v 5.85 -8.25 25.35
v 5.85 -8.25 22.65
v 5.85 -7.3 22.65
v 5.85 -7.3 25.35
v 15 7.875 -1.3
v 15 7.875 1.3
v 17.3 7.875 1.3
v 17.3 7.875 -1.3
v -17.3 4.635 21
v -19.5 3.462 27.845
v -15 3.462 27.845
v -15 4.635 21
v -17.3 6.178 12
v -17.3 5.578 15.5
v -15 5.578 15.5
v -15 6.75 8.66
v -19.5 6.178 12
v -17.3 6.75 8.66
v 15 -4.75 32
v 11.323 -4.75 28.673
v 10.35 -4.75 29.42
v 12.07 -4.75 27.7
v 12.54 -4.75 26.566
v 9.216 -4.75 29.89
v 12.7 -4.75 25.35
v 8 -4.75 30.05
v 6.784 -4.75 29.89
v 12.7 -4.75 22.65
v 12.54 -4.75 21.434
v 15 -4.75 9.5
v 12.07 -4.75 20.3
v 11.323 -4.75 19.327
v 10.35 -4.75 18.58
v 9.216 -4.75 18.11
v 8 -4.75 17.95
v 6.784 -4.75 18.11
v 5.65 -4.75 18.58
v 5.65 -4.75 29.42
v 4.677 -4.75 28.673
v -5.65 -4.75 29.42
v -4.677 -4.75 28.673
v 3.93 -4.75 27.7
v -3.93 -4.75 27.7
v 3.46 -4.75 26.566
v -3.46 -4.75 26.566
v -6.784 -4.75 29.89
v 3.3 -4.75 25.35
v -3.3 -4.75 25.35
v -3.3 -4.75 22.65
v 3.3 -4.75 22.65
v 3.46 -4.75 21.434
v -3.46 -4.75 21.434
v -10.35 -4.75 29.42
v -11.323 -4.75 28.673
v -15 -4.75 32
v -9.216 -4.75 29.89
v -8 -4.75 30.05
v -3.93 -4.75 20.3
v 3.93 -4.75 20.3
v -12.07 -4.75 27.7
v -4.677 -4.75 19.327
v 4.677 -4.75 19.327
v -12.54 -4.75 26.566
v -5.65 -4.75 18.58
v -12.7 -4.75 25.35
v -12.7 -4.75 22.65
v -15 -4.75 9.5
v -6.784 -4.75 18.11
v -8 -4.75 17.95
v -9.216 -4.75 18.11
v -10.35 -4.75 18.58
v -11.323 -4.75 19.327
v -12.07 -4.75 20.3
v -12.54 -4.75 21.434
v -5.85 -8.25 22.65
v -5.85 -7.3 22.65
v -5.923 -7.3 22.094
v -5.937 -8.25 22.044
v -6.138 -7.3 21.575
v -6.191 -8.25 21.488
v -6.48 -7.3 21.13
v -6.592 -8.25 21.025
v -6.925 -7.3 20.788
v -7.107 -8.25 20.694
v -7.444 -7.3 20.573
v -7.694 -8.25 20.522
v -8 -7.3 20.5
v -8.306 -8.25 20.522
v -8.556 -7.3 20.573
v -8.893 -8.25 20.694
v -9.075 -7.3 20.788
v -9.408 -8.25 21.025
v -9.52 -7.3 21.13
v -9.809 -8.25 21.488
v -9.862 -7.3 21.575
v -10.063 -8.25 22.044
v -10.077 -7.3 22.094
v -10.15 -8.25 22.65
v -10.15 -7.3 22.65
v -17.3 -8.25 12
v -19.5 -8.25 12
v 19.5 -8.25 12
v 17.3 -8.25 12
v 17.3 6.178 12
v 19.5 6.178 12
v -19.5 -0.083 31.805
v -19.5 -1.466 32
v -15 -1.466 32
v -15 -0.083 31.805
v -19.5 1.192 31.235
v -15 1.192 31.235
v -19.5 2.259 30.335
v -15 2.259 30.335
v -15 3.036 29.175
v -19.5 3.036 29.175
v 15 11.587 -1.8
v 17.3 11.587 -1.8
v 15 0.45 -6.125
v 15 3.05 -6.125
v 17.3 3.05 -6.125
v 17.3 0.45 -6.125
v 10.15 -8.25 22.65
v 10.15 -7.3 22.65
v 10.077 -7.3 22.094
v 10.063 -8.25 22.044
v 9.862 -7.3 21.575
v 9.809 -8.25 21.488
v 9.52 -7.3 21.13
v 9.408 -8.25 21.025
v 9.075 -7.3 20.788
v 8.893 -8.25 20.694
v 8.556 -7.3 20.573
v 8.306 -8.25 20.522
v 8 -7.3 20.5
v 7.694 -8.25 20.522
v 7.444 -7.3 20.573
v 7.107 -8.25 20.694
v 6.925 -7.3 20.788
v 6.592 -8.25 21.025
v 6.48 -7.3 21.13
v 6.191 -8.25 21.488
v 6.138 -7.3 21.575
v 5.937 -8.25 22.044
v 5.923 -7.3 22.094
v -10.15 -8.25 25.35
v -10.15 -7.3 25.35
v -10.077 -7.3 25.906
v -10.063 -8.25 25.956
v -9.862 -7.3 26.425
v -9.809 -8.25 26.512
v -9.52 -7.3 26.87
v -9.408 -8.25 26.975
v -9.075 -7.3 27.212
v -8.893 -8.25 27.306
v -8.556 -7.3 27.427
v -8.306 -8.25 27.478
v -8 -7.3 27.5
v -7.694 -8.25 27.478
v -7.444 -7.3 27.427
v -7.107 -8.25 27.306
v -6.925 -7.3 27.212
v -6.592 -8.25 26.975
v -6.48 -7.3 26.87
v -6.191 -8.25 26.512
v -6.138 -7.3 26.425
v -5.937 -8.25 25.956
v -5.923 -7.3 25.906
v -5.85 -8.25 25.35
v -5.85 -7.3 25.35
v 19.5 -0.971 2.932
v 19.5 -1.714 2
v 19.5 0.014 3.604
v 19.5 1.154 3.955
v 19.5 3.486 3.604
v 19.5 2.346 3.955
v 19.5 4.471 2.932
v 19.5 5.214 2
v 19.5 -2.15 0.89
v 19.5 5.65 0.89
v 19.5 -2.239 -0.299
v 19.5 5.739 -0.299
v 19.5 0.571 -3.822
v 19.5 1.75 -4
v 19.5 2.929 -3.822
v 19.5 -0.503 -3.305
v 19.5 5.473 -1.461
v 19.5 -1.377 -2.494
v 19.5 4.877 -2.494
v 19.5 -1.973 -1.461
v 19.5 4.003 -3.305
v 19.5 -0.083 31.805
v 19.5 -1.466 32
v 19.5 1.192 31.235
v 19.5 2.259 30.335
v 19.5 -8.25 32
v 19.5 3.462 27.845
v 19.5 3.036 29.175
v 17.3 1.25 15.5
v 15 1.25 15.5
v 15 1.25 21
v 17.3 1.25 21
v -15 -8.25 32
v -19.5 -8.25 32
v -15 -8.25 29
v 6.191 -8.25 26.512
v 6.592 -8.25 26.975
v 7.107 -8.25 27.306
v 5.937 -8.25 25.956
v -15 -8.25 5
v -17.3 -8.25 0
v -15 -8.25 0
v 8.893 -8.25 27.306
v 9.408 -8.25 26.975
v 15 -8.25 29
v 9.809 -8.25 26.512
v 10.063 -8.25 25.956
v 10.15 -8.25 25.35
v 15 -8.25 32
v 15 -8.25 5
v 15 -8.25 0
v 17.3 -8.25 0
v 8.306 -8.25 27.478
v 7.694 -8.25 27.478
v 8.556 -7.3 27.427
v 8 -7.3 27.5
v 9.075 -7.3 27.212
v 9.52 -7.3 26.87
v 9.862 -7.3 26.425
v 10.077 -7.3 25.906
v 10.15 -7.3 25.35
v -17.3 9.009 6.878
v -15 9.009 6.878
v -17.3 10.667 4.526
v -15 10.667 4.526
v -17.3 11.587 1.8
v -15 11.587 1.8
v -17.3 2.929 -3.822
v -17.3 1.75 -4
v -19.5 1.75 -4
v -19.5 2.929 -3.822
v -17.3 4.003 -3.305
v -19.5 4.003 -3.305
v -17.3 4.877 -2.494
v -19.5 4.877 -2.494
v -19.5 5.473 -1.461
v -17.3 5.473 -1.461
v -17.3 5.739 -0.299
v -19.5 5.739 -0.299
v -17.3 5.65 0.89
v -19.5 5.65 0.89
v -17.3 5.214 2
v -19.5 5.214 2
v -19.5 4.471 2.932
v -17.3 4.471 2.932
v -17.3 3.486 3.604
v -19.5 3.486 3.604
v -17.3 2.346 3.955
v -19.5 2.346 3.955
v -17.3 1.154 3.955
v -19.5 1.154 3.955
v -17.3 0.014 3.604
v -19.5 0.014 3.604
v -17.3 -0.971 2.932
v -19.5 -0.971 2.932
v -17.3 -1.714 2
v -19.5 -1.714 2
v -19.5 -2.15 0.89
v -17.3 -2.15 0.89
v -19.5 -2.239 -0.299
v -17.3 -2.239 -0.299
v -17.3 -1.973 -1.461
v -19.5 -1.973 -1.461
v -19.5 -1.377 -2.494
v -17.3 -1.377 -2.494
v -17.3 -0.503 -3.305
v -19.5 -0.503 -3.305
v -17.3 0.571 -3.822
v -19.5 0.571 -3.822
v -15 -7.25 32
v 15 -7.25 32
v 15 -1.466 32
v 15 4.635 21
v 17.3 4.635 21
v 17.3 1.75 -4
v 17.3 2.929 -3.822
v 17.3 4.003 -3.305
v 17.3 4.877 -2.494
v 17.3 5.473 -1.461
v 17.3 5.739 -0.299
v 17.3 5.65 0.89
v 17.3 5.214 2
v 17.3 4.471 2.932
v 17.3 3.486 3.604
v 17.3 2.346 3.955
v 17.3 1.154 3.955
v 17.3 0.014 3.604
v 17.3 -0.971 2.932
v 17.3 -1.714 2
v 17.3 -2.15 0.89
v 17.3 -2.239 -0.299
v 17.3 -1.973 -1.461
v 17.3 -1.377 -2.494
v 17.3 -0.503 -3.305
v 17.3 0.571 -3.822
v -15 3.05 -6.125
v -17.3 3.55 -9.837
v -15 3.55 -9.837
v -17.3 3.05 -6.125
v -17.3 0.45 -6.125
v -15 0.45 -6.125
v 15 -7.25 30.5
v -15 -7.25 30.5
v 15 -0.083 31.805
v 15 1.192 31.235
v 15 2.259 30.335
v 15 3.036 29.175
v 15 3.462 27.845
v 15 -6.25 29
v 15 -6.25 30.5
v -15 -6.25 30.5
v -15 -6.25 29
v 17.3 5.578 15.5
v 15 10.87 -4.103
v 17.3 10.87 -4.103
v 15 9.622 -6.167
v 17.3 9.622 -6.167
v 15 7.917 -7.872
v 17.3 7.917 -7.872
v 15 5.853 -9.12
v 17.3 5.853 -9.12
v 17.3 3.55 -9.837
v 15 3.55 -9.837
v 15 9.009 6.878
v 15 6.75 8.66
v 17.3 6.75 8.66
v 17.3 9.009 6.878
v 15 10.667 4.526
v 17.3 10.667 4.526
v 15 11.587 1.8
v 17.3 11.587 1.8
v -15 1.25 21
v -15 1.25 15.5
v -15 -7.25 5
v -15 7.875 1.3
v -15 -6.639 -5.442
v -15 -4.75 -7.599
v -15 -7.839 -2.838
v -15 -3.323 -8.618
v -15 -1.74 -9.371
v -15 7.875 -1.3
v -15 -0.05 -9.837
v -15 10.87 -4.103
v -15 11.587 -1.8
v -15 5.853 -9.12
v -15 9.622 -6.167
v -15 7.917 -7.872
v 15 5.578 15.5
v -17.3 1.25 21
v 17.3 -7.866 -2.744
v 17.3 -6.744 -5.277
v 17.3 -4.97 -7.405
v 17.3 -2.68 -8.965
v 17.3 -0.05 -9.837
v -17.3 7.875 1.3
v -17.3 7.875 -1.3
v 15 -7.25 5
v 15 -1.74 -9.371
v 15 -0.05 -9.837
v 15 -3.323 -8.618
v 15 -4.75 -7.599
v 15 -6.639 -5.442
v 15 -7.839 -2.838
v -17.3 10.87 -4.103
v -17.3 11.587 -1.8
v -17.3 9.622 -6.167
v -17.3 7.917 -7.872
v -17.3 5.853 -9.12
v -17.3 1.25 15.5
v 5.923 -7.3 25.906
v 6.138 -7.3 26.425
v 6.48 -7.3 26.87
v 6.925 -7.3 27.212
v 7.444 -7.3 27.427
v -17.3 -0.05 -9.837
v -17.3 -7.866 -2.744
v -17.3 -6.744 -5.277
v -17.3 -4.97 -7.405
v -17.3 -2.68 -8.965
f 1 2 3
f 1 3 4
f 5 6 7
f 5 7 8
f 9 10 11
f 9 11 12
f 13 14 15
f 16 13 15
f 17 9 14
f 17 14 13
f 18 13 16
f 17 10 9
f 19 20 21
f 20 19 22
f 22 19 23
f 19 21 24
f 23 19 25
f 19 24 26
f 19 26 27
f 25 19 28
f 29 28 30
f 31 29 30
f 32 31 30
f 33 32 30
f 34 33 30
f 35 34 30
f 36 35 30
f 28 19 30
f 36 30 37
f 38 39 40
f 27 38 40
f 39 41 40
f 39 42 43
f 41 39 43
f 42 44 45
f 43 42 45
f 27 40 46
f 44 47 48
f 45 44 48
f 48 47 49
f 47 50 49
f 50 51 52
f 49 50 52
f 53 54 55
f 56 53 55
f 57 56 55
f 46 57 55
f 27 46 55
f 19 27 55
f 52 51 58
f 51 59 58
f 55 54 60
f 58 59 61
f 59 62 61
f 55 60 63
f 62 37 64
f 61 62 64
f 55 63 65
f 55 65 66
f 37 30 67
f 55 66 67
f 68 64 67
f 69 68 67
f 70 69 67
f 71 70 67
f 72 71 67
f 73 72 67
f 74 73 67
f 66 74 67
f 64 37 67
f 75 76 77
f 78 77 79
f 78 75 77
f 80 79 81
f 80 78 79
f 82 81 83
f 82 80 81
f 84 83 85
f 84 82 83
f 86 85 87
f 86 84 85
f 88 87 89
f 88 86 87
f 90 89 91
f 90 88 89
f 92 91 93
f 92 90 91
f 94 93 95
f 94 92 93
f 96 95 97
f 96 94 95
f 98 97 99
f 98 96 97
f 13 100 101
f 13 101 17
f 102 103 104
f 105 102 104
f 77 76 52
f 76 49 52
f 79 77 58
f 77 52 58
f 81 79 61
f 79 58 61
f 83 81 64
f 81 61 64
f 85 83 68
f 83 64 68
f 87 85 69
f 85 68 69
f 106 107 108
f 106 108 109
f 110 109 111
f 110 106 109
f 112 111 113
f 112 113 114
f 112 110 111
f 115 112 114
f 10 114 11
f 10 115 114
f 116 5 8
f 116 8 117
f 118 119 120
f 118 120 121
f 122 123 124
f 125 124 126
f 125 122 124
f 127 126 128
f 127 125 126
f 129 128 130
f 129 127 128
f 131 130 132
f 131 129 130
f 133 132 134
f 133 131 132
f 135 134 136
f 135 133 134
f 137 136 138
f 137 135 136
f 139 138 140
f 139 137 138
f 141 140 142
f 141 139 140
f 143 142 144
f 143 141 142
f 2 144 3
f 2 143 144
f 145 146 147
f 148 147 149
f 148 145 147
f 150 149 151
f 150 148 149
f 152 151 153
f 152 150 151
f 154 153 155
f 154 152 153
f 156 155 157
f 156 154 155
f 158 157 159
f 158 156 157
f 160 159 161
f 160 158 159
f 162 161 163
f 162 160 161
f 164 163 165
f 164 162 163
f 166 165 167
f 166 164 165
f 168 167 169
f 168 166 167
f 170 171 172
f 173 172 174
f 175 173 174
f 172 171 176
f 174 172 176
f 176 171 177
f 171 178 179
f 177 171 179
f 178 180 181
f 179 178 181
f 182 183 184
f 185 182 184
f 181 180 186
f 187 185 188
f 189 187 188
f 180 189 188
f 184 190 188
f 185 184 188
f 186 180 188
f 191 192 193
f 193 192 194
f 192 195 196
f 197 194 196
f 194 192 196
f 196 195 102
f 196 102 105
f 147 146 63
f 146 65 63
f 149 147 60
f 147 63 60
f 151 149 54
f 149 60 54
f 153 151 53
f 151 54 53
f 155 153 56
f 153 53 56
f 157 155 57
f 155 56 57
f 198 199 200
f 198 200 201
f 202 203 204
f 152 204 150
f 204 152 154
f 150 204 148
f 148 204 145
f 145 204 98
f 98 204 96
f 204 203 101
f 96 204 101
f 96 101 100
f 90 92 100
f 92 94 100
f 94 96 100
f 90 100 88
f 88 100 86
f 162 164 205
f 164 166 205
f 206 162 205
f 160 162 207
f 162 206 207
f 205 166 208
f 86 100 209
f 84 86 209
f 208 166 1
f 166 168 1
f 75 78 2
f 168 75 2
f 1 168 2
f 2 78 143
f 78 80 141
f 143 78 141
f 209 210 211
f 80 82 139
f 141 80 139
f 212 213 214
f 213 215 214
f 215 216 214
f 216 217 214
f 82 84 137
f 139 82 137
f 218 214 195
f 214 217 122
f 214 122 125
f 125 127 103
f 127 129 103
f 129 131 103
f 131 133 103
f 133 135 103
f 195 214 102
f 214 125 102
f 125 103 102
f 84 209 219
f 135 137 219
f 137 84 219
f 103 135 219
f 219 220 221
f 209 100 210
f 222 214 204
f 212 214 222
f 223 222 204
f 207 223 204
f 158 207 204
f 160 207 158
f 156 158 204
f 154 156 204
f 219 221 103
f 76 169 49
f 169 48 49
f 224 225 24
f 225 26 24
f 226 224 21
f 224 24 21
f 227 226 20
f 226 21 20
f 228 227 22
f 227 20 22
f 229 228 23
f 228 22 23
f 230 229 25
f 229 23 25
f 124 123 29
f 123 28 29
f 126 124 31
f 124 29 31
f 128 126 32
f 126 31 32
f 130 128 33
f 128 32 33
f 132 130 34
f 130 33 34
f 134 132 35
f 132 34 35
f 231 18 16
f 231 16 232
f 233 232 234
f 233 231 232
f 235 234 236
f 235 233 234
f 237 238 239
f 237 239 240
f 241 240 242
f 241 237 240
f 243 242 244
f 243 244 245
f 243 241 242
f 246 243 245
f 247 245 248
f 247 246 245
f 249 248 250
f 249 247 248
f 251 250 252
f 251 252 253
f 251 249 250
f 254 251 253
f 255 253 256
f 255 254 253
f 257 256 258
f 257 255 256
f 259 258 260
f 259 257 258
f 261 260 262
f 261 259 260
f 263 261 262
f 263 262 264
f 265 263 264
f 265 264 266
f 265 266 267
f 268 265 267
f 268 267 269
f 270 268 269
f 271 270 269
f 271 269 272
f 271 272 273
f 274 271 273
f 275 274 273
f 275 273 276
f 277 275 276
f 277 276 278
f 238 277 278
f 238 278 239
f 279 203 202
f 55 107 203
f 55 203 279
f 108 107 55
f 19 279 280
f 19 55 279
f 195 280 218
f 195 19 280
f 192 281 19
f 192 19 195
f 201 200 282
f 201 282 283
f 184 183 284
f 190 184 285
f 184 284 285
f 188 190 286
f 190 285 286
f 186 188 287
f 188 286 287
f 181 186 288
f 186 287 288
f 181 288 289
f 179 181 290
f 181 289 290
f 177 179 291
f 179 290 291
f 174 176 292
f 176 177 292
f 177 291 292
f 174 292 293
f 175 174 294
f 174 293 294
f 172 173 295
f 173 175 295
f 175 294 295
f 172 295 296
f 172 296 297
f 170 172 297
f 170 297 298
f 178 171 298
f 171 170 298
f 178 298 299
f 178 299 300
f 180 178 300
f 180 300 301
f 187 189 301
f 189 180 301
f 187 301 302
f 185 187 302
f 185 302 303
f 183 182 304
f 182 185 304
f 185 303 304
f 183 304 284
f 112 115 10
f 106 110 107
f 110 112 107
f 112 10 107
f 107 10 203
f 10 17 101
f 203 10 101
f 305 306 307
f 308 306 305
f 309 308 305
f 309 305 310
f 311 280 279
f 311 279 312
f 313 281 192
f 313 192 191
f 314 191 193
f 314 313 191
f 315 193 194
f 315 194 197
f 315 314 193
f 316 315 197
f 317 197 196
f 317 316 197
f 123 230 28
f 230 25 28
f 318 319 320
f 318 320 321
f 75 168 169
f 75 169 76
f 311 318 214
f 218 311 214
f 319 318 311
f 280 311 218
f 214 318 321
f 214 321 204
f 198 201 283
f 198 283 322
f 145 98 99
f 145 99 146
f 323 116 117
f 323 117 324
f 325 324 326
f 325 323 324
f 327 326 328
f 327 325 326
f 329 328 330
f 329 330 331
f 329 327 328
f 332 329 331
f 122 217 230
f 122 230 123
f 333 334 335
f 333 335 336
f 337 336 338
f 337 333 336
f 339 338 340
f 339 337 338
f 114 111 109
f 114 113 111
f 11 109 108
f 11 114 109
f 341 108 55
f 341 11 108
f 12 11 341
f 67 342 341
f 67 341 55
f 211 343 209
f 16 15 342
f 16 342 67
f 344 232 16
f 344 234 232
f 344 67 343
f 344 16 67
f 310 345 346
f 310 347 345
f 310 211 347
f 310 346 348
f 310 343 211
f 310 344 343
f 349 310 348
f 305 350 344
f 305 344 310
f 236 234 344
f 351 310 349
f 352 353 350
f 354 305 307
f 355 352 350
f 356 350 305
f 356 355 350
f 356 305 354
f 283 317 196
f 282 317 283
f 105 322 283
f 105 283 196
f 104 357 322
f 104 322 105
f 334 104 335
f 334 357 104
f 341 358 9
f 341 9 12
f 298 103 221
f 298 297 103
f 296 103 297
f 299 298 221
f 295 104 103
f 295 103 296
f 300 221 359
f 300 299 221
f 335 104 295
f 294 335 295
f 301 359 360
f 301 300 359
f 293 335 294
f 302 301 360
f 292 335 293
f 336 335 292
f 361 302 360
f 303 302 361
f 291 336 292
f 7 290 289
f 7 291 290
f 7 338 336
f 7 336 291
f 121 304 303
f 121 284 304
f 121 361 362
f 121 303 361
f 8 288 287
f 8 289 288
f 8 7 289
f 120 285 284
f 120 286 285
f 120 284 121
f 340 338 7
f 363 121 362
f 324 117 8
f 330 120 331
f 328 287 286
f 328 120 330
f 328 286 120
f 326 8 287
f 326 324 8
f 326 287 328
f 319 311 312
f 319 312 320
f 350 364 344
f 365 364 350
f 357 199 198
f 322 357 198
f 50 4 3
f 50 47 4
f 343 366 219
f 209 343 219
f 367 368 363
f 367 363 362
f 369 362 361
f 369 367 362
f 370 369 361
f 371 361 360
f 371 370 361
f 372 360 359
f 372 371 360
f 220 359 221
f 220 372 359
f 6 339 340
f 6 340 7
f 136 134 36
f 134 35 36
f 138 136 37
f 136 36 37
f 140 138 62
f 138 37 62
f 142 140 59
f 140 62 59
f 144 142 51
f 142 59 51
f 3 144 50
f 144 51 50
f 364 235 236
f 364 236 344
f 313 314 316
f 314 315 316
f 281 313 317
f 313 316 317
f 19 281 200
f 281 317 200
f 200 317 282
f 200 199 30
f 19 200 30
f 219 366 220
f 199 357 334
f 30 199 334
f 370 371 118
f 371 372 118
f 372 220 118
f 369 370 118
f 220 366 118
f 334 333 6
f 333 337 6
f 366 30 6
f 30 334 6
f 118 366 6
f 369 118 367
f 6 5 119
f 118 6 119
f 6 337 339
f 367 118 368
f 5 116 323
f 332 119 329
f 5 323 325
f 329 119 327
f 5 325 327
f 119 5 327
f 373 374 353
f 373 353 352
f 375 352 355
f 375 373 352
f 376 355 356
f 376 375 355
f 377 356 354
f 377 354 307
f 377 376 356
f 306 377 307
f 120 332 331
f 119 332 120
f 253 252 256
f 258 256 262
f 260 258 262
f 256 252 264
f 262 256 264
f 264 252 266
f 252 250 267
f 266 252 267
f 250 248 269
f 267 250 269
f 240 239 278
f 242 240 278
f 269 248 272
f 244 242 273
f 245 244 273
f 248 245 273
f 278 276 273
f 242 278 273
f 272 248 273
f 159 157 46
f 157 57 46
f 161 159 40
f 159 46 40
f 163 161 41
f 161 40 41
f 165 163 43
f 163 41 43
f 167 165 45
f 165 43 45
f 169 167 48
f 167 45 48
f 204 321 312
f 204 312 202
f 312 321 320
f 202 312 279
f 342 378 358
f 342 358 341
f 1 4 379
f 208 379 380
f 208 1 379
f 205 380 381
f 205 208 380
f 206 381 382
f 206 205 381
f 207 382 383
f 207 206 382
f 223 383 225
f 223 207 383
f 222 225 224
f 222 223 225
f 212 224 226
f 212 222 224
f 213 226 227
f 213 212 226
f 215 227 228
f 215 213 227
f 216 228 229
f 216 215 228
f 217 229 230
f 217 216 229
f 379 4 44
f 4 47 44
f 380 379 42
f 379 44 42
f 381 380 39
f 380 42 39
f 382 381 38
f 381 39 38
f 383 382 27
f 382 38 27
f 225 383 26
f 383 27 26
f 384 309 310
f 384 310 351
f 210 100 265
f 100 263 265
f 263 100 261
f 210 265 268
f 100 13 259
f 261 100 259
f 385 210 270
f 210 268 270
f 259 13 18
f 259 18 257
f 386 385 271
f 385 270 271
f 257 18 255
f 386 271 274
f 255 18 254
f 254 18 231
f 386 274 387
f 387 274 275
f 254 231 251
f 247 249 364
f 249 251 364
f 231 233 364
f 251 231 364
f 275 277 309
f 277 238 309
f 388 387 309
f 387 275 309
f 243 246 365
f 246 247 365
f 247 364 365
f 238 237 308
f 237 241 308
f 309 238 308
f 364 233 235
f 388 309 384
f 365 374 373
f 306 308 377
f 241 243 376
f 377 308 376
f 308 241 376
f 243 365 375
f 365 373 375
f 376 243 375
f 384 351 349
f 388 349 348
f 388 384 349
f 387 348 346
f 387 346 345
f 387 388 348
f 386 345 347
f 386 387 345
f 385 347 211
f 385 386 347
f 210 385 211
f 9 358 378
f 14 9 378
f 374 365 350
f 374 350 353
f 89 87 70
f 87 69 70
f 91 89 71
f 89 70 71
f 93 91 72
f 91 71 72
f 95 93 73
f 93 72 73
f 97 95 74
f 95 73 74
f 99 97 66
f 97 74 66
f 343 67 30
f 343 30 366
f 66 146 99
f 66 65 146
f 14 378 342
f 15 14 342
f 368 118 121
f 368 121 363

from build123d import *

# Parameters (mm, degrees)
BODY_DEPTH                                       = 32
BODY_DEPTH_BACK                                  = 15
PIVOT_START                                      = 15
PIVOT_PIN_R_SKETCH_R                             = 4
PIVOT_PIN_R_DEPTH                                = 4.25
OUTSIDE_SHAPE_CUT_OUT_DEPTH                      = 40.272286666
OUTSIDE_SHAPE_CUT_OUT_DEPTH_BACK                 = 40.272286666
OUTSIDE_SHAPE_CUT_OUT_SKETCH_W                   = 49
OUTSIDE_SHAPE_CUT_OUT_SKETCH_H                   = 22
OUTSIDE_START                                    = 17.3
OUTSIDE_SHAPE_CUT_OUT_SKETCH_R_W                 = 24
OUTSIDE_SHAPE_CUT_OUT_SKETCH_R_H                 = 24
OUTSIDE_SHAPE_CUT_OUT_SKETCH_R_R                 = 4
OUTSIDE_SHAPE_CUT_OUT_R_DEPTH                    = 22.923727913
INSIDE_START                                     = 15
INSIDE_SHAPE_CUT_OUT_DEPTH                       = 30
LIGHTENING_START                                 = 1.25
LIGHTENING_2_SKETCH_W                            = 34.6
LIGHTENING_2_SKETCH_H                            = 5.5
LIGHTENING_2_DEPTH                               = 38.973727913
F_2_START                                        = -8.25
F_2_LATERAL_SLOTS_ORIENTATED_LONGITUDINALL_DEPTH = 3.5


with BuildPart() as part:
    # Profile Sketch → Body (new, two sides: drawn at the far end of the back side and taken through both)
    with BuildSketch(Plane.XY.offset(-BODY_DEPTH_BACK)):
        Polygon((-19.5, -8.25), (19.5, -8.25), (19.5, 11.75), (15, 11.75), (15, -4.75), (-15, -4.75), (-15, 11.75), (-19.5, 11.75), align=None)
    extrude(amount=BODY_DEPTH + BODY_DEPTH_BACK)

    # Pivot Pin R Sketch → Pivot Pin R (add)
    with BuildSketch(Plane(origin=(0, 0, 0), x_dir=(0, 0, -1), z_dir=(1, 0, 0)).offset(PIVOT_START)):
        with Locations((0, 1.75)):
            Circle(PIVOT_PIN_R_SKETCH_R)
    pivot_pin_r = extrude(amount=PIVOT_PIN_R_DEPTH)

    # Pivot Pin L: Pivot Pin R across plane
    add(pivot_pin_r.mirror(Plane(origin=(0, 0, 0), x_dir=(0, 0, 1), z_dir=(1, 0, 0))))

    # Outside Shape Cut Out Sketch → Outside Shape Cut Out (cut, two sides: drawn at the far end of the back side and taken through both)
    with BuildSketch(Plane(origin=(0, 0, 0), x_dir=(0, 0, -1), z_dir=(1, 0, 0)).offset(-OUTSIDE_SHAPE_CUT_OUT_DEPTH_BACK)):
        with Locations((-9.5, 0.75)):
            Rectangle(OUTSIDE_SHAPE_CUT_OUT_SKETCH_W, OUTSIDE_SHAPE_CUT_OUT_SKETCH_H)
        with BuildLine():
            Line((-27.844593584, 3.462159665), (-8.660254038, 6.75))
            ThreePointArc((-8.660254038, 6.75), (-5.762166553, 9.922969878), (-1.8, 11.586666102))
            Line((-1.8, 11.586666102), (-1.3, 7.87535696))
            Line((-1.3, 7.87535696), (1.3, 7.87535696))
            Line((1.3, 7.87535696), (1.8, 11.586666102))
            ThreePointArc((1.8, 11.586666102), (7.071067812, 8.821067812), (9.836666102, 3.55))
            Line((9.836666102, 3.55), (6.12535696, 3.05))
            Line((6.12535696, 3.05), (6.12535696, 0.45))
            Line((6.12535696, 0.45), (9.836666102, -0.05))
            ThreePointArc((9.836666102, -0.05), (6.403124237, -5.931145748), (0, -8.25))
            Line((0, -8.25), (-32, -8.25))
            Line((-32, -8.25), (-32, -1.46599026))
            ThreePointArc((-32, -1.46599026), (-30.822497084, 1.757131835), (-27.844593584, 3.462159665))
        make_face(mode=Mode.SUBTRACT)
    extrude(amount=OUTSIDE_SHAPE_CUT_OUT_DEPTH + OUTSIDE_SHAPE_CUT_OUT_DEPTH_BACK, mode=Mode.SUBTRACT)

    # Outside Shape Cut Out Sketch R → Outside Shape Cut Out R (cut, through all)
    with BuildSketch(Plane(origin=(0, 0, 0), x_dir=(0, 0, -1), z_dir=(1, 0, 0)).offset(OUTSIDE_START)):
        with Locations((0, 1.75)):
            Rectangle(OUTSIDE_SHAPE_CUT_OUT_SKETCH_R_W, OUTSIDE_SHAPE_CUT_OUT_SKETCH_R_H)
        with Locations((0, 1.75)):
            Circle(OUTSIDE_SHAPE_CUT_OUT_SKETCH_R_R, mode=Mode.SUBTRACT)
    outside_shape_cut_out_r = extrude(amount=OUTSIDE_SHAPE_CUT_OUT_R_DEPTH, mode=Mode.SUBTRACT)

    # Outside Shape Cut Out L: Outside Shape Cut Out R across plane
    add(outside_shape_cut_out_r.mirror(Plane(origin=(0, 0, 0), x_dir=(0, 0, 1), z_dir=(1, 0, 0))), mode=Mode.SUBTRACT)

    # Inside Shape Cut Out Sketch → Inside Shape Cut Out (cut)
    with BuildSketch(Plane(origin=(0, 0, 0), x_dir=(0, 0, -1), z_dir=(1, 0, 0)).offset(INSIDE_START)):
        Polygon((-29, -6.25), (-29, -8.25), (-32, -8.25), (-32, -7.25), (-30.5, -7.25), (-30.5, -6.25), align=None)
        Polygon((-9.5, -4.75), (-5, -7.25), (-5, -8.25), (7.599342077, -8.25), (7.599342077, -4.75), align=None)
    extrude(amount=-INSIDE_SHAPE_CUT_OUT_DEPTH, mode=Mode.SUBTRACT)

    # Lightening 2 Sketch → Lightening 2 (cut, through all)
    with BuildSketch(Plane(origin=(0, 0, 0), x_dir=(1, 0, 0), z_dir=(0, 1, 0)).offset(LIGHTENING_START)):
        with Locations((0, -18.25)):
            Rectangle(LIGHTENING_2_SKETCH_W, LIGHTENING_2_SKETCH_H)
    extrude(amount=LIGHTENING_2_DEPTH, mode=Mode.SUBTRACT)

    # 2 Lateral Slots Orientated Longitudinall: read off the stored shape, not the designer's step
    # 2 Lateral Slots Orientated Longitudi 2 → 2 Lateral Slots Orientated Longitudinall (cut)
    with BuildSketch(Plane(origin=(0, 0, 0), x_dir=(1, 0, 0), z_dir=(0, 1, 0)).offset(F_2_START)):
        with BuildLine():
            Line((5.85, -22.65), (5.85, -25.35))
            ThreePointArc((5.85, -25.35), (8, -27.5), (10.15, -25.35))
            Line((10.15, -25.35), (10.15, -22.65))
            ThreePointArc((10.15, -22.65), (8, -20.5), (5.85, -22.65))
        make_face()
        with BuildLine():
            Line((-10.15, -22.65), (-10.15, -25.35))
            ThreePointArc((-10.15, -25.35), (-8, -27.5), (-5.85, -25.35))
            Line((-5.85, -25.35), (-5.85, -22.65))
            ThreePointArc((-5.85, -22.65), (-8, -20.5), (-10.15, -22.65))
        make_face()
    extrude(amount=F_2_LATERAL_SLOTS_ORIENTATED_LONGITUDINALL_DEPTH, mode=Mode.SUBTRACT)

    # 2 Lateral Slots Orientated Longitudi 3: loft between two sections, ruled curve by curve
    f_2_lateral_slots_orientated_longitudi_3_from = [
        Edge.make_three_point_arc((5.85, -7.3, 25.35), (6.47972042, -7.3, 26.87027958), (8, -7.3, 27.5)),
        Edge.make_three_point_arc((8, -7.3, 27.5), (9.52027958, -7.3, 26.87027958), (10.15, -7.3, 25.35)),
        Edge.make_three_point_arc((10.15, -7.3, 22.65), (9.52027958, -7.3, 21.12972042), (8, -7.3, 20.5)),
        Edge.make_three_point_arc((8, -7.3, 20.5), (6.47972042, -7.3, 21.12972042), (5.85, -7.3, 22.65)),
        Edge.make_line((10.15, -7.3, 25.35), (10.15, -7.3, 22.65)),
        Edge.make_line((5.85, -7.3, 25.35), (5.85, -7.3, 22.65)),
    ]
    f_2_lateral_slots_orientated_longitudi_3_to = [
        Edge.make_three_point_arc((3.3, -4.75, 25.35), (4.676598128, -4.75, 28.673401872), (8, -4.75, 30.05)),
        Edge.make_three_point_arc((8, -4.75, 30.05), (11.323401872, -4.75, 28.673401872), (12.7, -4.75, 25.35)),
        Edge.make_three_point_arc((12.7, -4.75, 22.65), (11.323401872, -4.75, 19.326598128), (8, -4.75, 17.95)),
        Edge.make_three_point_arc((8, -4.75, 17.95), (4.676598128, -4.75, 19.326598128), (3.3, -4.75, 22.65)),
        Edge.make_line((12.7, -4.75, 25.35), (12.7, -4.75, 22.65)),
        Edge.make_line((3.3, -4.75, 25.35), (3.3, -4.75, 22.65)),
    ]
    f_2_lateral_slots_orientated_longitudi_3 = Solid(Shell([*[Face.make_surface_from_curves(f_2_lateral_slots_orientated_longitudi_3_from[k], f_2_lateral_slots_orientated_longitudi_3_to[k]) for k in range(6)], Face(Wire(f_2_lateral_slots_orientated_longitudi_3_from)), Face(Wire(f_2_lateral_slots_orientated_longitudi_3_to))]))
    add(f_2_lateral_slots_orientated_longitudi_3, mode=Mode.SUBTRACT)

    # 2 Lateral Slots Orientated Longitudi 4: loft between two sections, ruled curve by curve
    f_2_lateral_slots_orientated_longitudi_4_from = [
        Edge.make_three_point_arc((-10.15, -7.3, 25.35), (-9.52027958, -7.3, 26.87027958), (-8, -7.3, 27.5)),
        Edge.make_three_point_arc((-8, -7.3, 27.5), (-6.47972042, -7.3, 26.87027958), (-5.85, -7.3, 25.35)),
        Edge.make_three_point_arc((-5.85, -7.3, 22.65), (-6.47972042, -7.3, 21.12972042), (-8, -7.3, 20.5)),
        Edge.make_three_point_arc((-8, -7.3, 20.5), (-9.52027958, -7.3, 21.12972042), (-10.15, -7.3, 22.65)),
        Edge.make_line((-5.85, -7.3, 25.35), (-5.85, -7.3, 22.65)),
        Edge.make_line((-10.15, -7.3, 25.35), (-10.15, -7.3, 22.65)),
    ]
    f_2_lateral_slots_orientated_longitudi_4_to = [
        Edge.make_three_point_arc((-12.7, -4.75, 25.35), (-11.323401872, -4.75, 28.673401872), (-8, -4.75, 30.05)),
        Edge.make_three_point_arc((-8, -4.75, 30.05), (-4.676598128, -4.75, 28.673401872), (-3.3, -4.75, 25.35)),
        Edge.make_three_point_arc((-3.3, -4.75, 22.65), (-4.676598128, -4.75, 19.326598128), (-8, -4.75, 17.95)),
        Edge.make_three_point_arc((-8, -4.75, 17.95), (-11.323401872, -4.75, 19.326598128), (-12.7, -4.75, 22.65)),
        Edge.make_line((-3.3, -4.75, 25.35), (-3.3, -4.75, 22.65)),
        Edge.make_line((-12.7, -4.75, 25.35), (-12.7, -4.75, 22.65)),
    ]
    f_2_lateral_slots_orientated_longitudi_4 = Solid(Shell([*[Face.make_surface_from_curves(f_2_lateral_slots_orientated_longitudi_4_from[k], f_2_lateral_slots_orientated_longitudi_4_to[k]) for k in range(6)], Face(Wire(f_2_lateral_slots_orientated_longitudi_4_from)), Face(Wire(f_2_lateral_slots_orientated_longitudi_4_to))]))
    add(f_2_lateral_slots_orientated_longitudi_4, mode=Mode.SUBTRACT)


solid = part.part
